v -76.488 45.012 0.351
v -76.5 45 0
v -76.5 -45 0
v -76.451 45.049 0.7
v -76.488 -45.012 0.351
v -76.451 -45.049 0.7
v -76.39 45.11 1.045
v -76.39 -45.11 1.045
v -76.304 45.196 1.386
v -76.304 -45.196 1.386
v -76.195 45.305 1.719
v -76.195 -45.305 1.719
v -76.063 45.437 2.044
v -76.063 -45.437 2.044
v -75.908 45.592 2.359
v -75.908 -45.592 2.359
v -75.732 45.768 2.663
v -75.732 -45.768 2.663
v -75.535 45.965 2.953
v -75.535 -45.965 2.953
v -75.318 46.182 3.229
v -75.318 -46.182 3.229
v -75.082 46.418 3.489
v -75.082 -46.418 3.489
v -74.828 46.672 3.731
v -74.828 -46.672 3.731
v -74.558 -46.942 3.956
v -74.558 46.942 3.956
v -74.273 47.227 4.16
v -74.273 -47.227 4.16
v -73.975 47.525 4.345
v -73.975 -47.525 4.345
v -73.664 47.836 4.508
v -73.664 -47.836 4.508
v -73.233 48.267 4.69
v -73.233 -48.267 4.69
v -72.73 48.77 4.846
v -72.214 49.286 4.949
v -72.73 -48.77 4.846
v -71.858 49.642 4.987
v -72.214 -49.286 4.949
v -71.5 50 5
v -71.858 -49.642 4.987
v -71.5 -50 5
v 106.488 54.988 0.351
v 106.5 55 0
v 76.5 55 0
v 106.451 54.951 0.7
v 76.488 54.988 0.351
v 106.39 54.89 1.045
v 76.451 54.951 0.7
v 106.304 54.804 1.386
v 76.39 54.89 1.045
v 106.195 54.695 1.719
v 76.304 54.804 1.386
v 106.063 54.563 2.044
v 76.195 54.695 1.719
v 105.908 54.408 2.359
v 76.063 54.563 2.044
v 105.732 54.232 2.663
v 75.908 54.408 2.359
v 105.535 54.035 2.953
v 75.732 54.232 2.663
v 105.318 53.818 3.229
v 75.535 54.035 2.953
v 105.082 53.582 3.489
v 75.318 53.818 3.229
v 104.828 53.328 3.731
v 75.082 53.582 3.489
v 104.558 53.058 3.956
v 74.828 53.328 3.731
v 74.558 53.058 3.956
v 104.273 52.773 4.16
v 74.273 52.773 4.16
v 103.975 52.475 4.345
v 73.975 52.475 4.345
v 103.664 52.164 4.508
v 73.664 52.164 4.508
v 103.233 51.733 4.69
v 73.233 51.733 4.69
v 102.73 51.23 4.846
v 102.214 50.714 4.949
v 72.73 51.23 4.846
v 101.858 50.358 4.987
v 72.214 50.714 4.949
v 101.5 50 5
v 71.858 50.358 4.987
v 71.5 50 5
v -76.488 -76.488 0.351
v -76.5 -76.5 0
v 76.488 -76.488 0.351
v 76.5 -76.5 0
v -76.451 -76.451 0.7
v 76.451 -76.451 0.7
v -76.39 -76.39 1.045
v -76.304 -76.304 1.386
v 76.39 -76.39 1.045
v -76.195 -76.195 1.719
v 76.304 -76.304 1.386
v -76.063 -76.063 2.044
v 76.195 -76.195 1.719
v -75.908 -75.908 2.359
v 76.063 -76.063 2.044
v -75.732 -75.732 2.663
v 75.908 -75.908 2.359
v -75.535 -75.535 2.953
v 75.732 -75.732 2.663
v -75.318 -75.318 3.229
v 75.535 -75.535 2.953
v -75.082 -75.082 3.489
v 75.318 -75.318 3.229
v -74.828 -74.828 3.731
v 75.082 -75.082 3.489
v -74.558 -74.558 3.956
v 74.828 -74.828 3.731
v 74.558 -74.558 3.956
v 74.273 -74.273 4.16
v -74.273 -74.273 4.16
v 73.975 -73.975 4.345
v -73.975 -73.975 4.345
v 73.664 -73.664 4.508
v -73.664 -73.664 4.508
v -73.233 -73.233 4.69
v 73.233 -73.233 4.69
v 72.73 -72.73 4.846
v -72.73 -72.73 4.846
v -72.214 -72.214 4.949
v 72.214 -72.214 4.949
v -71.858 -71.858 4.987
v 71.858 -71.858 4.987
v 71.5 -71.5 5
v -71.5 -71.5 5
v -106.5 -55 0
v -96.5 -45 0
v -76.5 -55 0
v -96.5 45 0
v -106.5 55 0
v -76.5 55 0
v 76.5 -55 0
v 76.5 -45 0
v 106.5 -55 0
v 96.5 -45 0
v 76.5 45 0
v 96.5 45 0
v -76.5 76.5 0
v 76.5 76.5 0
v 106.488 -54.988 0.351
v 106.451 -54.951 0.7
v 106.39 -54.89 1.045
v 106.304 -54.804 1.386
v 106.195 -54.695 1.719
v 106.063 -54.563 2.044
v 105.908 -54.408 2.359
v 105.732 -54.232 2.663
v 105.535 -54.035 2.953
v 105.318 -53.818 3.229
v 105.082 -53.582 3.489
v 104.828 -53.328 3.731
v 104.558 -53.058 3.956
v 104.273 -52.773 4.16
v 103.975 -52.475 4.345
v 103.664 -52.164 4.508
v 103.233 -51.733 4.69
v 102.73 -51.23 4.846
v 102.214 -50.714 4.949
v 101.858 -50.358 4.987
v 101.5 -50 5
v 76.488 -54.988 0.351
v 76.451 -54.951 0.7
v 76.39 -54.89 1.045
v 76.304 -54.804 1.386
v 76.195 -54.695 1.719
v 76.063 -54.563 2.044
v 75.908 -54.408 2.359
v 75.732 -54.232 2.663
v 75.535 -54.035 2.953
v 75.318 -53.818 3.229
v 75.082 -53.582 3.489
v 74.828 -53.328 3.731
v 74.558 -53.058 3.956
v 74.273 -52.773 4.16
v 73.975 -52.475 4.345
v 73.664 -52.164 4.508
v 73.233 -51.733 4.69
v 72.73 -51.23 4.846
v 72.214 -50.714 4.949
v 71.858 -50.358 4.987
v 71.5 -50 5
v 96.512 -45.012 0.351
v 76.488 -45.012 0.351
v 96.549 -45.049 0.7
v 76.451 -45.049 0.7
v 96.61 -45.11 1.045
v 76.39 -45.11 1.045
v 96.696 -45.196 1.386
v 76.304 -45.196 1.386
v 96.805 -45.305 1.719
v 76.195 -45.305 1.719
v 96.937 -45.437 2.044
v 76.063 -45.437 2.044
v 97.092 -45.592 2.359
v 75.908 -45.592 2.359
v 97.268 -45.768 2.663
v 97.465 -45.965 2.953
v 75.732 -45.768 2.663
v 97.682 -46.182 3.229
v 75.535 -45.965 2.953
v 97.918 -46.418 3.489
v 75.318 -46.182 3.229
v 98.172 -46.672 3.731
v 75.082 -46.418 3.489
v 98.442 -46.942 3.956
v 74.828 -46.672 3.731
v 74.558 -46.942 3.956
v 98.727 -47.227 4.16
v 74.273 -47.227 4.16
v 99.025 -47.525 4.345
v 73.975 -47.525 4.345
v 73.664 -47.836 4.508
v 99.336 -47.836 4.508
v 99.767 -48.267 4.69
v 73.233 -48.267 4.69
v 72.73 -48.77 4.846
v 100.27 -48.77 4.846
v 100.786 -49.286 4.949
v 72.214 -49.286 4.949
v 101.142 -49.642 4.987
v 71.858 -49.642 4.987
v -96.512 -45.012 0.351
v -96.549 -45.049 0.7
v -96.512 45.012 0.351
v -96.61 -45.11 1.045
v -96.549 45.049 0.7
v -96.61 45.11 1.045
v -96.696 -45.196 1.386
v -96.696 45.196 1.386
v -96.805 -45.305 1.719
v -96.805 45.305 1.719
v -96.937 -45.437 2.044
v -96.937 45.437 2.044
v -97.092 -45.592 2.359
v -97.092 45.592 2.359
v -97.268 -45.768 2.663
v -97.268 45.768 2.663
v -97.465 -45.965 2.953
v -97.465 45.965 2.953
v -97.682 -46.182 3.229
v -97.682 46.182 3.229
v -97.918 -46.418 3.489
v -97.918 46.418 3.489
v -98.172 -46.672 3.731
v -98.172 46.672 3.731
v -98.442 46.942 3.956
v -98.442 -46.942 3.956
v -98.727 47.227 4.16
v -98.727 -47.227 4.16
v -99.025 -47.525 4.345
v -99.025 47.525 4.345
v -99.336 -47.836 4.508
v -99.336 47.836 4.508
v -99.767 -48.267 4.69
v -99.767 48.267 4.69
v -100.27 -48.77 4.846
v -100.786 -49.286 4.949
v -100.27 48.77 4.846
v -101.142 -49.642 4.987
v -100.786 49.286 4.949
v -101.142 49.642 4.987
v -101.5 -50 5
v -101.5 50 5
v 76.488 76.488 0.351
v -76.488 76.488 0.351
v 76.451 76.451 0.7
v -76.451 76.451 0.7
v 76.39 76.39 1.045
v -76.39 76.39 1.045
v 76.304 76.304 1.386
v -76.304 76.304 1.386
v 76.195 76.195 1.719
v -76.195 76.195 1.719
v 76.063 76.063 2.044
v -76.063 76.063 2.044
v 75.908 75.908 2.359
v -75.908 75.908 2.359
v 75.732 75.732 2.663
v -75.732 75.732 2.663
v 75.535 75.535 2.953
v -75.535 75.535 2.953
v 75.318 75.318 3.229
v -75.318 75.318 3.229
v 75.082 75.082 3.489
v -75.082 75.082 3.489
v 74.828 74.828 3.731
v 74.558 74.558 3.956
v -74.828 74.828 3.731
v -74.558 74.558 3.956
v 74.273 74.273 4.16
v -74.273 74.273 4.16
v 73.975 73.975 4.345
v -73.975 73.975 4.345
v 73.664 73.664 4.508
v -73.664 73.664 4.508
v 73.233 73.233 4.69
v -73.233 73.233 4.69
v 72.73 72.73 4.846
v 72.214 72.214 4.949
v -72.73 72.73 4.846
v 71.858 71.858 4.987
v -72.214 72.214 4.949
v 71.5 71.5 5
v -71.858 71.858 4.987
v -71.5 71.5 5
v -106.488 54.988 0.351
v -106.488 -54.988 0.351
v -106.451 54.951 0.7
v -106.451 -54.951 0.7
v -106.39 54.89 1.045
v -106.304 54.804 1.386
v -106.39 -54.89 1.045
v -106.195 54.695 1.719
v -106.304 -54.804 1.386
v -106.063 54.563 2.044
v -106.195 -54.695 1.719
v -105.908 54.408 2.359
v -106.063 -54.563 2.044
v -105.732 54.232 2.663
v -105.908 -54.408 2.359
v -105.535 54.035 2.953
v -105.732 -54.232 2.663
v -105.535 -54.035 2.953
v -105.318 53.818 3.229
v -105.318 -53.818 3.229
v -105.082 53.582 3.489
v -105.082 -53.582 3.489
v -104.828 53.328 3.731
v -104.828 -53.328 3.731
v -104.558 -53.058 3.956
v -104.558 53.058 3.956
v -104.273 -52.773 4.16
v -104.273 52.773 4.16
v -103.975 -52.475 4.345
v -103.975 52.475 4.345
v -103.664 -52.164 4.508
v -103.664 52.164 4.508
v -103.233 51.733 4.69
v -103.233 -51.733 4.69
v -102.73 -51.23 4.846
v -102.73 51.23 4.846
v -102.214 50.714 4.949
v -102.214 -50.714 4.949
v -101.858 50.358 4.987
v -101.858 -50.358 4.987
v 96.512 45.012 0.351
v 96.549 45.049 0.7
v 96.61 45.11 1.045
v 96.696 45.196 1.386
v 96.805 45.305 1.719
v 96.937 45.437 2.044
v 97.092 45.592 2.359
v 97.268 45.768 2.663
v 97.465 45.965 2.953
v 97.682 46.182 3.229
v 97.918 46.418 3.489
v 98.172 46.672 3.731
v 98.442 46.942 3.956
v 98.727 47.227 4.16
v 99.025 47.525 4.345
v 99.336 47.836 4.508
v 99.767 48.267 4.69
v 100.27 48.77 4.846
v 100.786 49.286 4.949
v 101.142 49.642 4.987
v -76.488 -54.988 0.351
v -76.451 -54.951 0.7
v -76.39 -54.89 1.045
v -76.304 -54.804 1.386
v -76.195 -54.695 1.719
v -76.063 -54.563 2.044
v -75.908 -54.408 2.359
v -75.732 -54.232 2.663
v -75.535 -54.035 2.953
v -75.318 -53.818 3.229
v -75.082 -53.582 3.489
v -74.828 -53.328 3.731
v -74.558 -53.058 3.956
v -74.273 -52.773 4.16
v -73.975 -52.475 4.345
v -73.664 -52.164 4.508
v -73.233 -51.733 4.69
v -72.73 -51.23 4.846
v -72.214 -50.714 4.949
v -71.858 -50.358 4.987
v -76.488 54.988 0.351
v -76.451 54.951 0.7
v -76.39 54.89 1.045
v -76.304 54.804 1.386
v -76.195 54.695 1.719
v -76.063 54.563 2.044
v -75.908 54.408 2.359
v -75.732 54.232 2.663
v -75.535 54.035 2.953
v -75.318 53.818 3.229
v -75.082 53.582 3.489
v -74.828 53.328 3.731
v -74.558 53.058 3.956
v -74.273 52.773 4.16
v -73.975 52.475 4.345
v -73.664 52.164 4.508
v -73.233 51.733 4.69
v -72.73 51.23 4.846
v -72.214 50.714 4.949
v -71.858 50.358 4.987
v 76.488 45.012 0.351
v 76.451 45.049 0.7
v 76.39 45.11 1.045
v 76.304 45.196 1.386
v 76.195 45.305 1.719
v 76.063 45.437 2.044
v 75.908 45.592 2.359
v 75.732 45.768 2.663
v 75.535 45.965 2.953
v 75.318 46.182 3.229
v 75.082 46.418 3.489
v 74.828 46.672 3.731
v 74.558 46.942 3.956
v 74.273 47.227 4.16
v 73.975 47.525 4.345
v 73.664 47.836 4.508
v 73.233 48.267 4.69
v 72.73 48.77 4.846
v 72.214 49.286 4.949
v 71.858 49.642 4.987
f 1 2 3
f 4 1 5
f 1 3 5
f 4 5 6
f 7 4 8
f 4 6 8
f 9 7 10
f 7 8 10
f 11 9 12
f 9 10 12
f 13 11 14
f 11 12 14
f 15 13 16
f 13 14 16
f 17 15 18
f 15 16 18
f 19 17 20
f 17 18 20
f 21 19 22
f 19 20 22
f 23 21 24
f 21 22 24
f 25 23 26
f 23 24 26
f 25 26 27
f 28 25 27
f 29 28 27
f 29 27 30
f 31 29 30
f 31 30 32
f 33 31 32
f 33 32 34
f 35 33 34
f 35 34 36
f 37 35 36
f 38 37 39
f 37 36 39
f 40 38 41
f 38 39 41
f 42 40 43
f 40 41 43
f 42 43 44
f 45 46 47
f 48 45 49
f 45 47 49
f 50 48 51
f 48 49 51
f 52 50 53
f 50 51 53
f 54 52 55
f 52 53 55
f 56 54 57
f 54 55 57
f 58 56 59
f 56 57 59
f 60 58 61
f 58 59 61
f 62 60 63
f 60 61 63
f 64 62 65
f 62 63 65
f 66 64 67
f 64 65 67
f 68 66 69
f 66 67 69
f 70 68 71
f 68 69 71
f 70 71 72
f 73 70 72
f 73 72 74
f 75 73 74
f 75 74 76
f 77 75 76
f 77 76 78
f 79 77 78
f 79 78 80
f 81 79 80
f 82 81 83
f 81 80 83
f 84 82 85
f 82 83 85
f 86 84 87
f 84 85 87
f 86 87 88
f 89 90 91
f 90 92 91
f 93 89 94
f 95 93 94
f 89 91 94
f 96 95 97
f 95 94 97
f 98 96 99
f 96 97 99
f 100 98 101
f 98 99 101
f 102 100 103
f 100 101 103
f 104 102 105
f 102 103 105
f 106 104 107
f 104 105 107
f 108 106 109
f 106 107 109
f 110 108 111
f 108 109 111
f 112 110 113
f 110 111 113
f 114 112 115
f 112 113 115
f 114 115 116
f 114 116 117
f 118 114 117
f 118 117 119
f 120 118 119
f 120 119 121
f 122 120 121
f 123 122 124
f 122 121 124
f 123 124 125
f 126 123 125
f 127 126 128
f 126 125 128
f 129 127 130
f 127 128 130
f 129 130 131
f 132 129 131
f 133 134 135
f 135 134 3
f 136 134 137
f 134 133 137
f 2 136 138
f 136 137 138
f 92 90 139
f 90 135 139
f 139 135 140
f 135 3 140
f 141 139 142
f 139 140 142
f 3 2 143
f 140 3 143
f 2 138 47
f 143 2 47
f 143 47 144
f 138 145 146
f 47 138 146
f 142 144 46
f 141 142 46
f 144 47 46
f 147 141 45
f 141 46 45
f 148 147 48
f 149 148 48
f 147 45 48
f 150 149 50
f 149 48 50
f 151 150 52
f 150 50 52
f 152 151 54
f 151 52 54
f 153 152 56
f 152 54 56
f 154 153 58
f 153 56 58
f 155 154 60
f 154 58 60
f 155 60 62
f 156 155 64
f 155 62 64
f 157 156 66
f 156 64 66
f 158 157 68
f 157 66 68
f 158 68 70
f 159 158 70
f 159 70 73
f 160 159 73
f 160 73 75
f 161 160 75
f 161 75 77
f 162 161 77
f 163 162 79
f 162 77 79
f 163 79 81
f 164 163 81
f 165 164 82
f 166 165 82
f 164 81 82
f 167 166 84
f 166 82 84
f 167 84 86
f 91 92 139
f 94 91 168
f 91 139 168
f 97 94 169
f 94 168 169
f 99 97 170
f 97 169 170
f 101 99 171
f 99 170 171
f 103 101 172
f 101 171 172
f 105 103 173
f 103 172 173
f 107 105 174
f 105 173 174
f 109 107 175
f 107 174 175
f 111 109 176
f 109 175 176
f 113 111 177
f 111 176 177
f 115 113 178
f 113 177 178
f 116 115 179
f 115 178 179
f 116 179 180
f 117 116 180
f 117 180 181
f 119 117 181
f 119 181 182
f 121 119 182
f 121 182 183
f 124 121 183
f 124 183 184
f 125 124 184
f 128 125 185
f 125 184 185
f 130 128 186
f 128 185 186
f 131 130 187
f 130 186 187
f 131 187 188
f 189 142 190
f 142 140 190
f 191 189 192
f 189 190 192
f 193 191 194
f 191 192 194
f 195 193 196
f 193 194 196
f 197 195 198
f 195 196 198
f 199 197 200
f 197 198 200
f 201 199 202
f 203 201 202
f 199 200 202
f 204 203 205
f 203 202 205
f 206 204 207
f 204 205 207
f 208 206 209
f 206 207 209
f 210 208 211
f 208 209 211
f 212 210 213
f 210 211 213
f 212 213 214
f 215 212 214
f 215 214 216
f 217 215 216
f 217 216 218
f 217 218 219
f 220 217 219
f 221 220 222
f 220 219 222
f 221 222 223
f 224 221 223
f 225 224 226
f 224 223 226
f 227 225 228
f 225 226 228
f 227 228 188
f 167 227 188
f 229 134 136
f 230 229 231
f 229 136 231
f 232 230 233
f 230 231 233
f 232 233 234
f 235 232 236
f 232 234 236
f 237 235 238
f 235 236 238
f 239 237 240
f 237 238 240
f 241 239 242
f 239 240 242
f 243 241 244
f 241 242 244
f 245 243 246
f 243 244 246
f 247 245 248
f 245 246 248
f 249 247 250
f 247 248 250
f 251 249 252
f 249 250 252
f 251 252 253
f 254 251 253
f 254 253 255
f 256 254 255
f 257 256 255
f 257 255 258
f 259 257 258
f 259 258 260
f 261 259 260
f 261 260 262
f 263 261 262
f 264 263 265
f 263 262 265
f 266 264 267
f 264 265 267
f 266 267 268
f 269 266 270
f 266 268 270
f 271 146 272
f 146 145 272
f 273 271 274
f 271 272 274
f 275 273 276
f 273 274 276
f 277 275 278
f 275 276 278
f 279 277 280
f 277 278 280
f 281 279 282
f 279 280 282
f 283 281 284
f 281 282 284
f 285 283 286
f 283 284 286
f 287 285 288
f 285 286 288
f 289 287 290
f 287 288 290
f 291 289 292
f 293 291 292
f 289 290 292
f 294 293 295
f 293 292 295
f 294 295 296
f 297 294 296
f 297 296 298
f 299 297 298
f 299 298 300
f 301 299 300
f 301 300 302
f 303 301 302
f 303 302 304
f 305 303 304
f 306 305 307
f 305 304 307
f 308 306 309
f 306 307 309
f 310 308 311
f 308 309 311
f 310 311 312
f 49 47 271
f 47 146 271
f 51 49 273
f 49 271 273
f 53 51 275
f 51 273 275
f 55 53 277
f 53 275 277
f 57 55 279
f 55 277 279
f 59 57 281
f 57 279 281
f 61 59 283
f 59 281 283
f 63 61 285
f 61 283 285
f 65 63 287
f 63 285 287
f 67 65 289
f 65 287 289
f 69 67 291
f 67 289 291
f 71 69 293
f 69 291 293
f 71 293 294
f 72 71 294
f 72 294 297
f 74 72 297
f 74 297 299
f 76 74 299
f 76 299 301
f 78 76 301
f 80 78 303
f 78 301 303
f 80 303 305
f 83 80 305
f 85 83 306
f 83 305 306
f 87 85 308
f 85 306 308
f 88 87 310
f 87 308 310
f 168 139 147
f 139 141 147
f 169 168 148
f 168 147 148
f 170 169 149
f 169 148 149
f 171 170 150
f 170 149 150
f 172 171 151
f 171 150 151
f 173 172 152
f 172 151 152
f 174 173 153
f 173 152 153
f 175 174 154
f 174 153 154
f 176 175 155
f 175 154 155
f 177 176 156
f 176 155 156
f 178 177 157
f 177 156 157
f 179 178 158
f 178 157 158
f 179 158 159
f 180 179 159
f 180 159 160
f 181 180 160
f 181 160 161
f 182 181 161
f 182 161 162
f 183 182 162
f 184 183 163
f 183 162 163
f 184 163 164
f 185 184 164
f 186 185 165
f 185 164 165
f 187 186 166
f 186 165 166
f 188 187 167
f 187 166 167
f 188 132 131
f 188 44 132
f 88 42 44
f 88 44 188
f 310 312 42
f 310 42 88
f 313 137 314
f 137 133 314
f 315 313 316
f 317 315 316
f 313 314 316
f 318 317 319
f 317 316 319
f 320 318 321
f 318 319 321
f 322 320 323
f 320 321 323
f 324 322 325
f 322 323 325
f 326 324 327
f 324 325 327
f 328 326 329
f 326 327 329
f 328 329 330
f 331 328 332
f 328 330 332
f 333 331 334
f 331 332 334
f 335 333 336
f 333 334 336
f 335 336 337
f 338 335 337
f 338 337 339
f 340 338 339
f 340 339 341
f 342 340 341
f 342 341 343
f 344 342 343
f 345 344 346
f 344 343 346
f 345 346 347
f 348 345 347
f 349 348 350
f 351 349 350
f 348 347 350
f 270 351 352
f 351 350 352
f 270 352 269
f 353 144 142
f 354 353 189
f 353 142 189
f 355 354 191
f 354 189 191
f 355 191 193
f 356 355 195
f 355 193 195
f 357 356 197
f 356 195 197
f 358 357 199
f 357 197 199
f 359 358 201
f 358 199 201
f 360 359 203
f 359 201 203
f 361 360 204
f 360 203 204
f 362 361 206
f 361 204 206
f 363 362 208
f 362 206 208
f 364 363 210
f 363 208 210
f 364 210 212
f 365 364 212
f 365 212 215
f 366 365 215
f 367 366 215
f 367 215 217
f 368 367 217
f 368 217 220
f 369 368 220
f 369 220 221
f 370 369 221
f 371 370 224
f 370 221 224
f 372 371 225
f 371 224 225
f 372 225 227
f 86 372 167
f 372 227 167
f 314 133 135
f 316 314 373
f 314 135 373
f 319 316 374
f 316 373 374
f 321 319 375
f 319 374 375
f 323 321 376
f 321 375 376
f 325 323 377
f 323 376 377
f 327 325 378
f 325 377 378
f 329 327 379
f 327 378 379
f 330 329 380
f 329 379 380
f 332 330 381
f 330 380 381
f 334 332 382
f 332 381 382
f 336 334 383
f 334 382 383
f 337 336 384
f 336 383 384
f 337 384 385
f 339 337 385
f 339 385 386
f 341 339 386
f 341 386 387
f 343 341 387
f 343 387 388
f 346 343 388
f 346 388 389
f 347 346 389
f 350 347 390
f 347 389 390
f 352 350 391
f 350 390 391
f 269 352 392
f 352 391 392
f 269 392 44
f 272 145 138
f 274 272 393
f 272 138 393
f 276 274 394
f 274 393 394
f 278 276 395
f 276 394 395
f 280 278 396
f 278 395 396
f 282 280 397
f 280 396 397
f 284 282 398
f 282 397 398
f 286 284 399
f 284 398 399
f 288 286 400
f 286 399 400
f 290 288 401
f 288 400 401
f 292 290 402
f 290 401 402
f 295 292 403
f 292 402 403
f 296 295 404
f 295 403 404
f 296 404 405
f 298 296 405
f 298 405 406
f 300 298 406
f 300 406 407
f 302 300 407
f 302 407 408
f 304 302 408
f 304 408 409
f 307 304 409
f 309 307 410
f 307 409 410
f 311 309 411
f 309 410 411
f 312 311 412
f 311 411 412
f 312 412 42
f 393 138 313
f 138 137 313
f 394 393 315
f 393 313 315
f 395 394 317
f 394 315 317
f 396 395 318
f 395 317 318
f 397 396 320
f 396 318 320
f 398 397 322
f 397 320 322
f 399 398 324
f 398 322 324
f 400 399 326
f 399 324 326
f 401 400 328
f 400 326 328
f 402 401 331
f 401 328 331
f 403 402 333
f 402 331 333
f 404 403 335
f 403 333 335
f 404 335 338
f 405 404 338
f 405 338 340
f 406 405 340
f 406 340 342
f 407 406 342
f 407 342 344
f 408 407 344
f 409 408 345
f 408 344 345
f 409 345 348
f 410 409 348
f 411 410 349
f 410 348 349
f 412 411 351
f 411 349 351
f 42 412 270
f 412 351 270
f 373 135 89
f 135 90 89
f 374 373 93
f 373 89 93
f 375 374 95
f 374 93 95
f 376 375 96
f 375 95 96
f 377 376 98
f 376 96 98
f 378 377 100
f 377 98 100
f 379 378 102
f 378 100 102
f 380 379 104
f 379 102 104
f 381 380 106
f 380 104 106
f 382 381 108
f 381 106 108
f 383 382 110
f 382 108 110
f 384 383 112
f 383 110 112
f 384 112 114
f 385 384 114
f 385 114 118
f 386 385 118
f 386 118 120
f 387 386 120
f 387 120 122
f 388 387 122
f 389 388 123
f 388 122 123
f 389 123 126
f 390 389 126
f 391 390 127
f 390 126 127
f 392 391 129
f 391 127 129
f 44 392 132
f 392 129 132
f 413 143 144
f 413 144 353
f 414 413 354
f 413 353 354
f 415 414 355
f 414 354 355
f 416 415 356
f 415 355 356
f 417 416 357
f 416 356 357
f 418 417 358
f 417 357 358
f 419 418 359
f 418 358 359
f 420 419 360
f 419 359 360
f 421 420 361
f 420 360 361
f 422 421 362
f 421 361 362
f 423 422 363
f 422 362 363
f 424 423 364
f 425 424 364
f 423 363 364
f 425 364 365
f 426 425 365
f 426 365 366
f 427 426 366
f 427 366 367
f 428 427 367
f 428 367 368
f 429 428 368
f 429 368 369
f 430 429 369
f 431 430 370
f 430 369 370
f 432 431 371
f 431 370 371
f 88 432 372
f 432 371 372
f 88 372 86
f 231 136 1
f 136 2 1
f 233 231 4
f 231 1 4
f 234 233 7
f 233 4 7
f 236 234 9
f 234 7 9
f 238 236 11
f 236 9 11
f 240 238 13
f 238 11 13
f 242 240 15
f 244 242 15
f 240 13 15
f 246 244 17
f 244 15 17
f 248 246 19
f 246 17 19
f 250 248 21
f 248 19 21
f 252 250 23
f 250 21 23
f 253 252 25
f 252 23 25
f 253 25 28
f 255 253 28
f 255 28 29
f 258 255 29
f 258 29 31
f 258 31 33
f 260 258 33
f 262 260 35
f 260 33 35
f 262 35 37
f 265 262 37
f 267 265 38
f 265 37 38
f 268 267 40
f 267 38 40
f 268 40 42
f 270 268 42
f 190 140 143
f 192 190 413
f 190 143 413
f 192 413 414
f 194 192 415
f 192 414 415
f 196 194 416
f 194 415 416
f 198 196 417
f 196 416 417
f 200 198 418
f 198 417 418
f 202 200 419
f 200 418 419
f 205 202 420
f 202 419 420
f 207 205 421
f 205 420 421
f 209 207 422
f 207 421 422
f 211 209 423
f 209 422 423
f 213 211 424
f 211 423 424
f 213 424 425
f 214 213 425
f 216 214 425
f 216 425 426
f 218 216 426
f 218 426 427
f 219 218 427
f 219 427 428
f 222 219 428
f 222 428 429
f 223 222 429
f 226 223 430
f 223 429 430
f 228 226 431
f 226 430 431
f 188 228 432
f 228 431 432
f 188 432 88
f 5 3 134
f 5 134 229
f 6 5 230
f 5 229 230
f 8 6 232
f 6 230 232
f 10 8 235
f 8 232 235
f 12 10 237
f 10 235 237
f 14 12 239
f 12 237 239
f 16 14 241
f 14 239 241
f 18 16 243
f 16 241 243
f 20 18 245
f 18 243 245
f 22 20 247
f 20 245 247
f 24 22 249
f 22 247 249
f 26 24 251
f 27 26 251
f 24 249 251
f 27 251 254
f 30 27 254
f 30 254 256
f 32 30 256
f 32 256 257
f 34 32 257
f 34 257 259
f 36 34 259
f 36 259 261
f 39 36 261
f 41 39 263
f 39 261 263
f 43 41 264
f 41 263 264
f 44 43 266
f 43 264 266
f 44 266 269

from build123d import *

# Parameters (mm, degrees)
F2_DEPTH = 5
F3_R     = 4.99999


# Not quite as in the source:
# - a fillet or chamfer is up to 0.001 mm smaller than in the source, because OpenCascade refuses the exact size


with BuildPart() as f2:
    # F1 (on Top) → F2 (new body)
    with BuildSketch(Plane.XY):
        Polygon((-76.5, -76.5), (76.5, -76.5), (76.5, -55), (76.5, -45), (76.5, 45), (76.5, 55), (76.5, 76.5), (-76.5, 76.5), (-76.5, 55), (-76.5, 45), (-76.5, -45), (-76.5, -55), align=None)
        Polygon((76.5, -45), (76.5, -55), (106.5, -55), (106.5, 55), (76.5, 55), (76.5, 45), (96.5, 45), (96.5, -45), align=None)
        Polygon((-106.5, -55), (-76.5, -55), (-76.5, -45), (-96.5, -45), (-96.5, 45), (-76.5, 45), (-76.5, 55), (-106.5, 55), align=None)
    extrude(amount=F2_DEPTH)

    # F3 (radius 5 in the source; OpenCascade refuses exactly that, so slightly less here)
    f3_edges = [f2.edges().sort_by_distance(p)[0] for p in [
        (0, -76.5, 5),
        (76.5, -65.75, 5),
        (91.5, -55, 5),
        (106.5, 0, 5),
        (91.5, 55, 5),
        (76.5, 65.75, 5),
        (0, 76.5, 5),
        (-76.5, 65.75, 5),
        (-91.5, 55, 5),
        (-106.5, 0, 5),
        (-91.5, -55, 5),
        (-76.5, -65.75, 5),
        (-76.5, 0, 5),
        (-86.5, -45, 5),
        (-96.5, 0, 5),
        (-86.5, 45, 5),
        (76.5, 0, 5),
        (86.5, 45, 5),
        (96.5, 0, 5),
        (86.5, -45, 5),
    ]]
    fillet(f3_edges, radius=F3_R)


solid = f2.part
